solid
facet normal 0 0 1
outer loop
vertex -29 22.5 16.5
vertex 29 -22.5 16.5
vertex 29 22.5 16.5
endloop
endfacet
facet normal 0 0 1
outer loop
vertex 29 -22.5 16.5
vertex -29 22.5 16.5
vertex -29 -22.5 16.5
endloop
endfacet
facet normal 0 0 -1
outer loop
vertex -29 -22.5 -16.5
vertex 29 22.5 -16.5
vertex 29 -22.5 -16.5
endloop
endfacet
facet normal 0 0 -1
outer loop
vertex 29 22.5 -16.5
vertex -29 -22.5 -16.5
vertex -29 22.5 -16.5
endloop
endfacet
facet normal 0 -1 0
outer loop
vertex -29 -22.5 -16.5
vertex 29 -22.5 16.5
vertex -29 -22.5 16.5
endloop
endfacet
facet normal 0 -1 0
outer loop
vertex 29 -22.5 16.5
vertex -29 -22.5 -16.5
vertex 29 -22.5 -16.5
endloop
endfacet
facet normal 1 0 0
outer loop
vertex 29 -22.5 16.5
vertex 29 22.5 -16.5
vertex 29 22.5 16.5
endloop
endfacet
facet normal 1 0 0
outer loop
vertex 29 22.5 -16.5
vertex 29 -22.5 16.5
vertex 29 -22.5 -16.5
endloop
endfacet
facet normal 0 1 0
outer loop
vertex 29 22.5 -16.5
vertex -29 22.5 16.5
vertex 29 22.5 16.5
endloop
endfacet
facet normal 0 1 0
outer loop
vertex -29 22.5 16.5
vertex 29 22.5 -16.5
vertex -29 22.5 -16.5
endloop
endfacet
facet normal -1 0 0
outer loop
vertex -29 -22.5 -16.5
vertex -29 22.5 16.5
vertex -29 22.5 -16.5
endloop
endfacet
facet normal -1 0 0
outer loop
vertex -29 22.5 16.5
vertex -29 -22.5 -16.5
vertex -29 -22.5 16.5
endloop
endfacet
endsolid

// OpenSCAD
// Parameters
length_mm = 58; //[29:116:1]
width_mm = 45; //[22.5:90:1]
height_mm = 33; //[16.5:66:1]
corner_radius_mm = 0; //[0:8:0.5]

// Main body of the SSR module
module mod() {
  color([0.85, 0.85, 0.8]) { // Off-white color for the enclosure
    cube([length_mm, width_mm, height_mm], center=true);
  }
}

// Assembly
module assembly() {
  mod();
}

assembly();
